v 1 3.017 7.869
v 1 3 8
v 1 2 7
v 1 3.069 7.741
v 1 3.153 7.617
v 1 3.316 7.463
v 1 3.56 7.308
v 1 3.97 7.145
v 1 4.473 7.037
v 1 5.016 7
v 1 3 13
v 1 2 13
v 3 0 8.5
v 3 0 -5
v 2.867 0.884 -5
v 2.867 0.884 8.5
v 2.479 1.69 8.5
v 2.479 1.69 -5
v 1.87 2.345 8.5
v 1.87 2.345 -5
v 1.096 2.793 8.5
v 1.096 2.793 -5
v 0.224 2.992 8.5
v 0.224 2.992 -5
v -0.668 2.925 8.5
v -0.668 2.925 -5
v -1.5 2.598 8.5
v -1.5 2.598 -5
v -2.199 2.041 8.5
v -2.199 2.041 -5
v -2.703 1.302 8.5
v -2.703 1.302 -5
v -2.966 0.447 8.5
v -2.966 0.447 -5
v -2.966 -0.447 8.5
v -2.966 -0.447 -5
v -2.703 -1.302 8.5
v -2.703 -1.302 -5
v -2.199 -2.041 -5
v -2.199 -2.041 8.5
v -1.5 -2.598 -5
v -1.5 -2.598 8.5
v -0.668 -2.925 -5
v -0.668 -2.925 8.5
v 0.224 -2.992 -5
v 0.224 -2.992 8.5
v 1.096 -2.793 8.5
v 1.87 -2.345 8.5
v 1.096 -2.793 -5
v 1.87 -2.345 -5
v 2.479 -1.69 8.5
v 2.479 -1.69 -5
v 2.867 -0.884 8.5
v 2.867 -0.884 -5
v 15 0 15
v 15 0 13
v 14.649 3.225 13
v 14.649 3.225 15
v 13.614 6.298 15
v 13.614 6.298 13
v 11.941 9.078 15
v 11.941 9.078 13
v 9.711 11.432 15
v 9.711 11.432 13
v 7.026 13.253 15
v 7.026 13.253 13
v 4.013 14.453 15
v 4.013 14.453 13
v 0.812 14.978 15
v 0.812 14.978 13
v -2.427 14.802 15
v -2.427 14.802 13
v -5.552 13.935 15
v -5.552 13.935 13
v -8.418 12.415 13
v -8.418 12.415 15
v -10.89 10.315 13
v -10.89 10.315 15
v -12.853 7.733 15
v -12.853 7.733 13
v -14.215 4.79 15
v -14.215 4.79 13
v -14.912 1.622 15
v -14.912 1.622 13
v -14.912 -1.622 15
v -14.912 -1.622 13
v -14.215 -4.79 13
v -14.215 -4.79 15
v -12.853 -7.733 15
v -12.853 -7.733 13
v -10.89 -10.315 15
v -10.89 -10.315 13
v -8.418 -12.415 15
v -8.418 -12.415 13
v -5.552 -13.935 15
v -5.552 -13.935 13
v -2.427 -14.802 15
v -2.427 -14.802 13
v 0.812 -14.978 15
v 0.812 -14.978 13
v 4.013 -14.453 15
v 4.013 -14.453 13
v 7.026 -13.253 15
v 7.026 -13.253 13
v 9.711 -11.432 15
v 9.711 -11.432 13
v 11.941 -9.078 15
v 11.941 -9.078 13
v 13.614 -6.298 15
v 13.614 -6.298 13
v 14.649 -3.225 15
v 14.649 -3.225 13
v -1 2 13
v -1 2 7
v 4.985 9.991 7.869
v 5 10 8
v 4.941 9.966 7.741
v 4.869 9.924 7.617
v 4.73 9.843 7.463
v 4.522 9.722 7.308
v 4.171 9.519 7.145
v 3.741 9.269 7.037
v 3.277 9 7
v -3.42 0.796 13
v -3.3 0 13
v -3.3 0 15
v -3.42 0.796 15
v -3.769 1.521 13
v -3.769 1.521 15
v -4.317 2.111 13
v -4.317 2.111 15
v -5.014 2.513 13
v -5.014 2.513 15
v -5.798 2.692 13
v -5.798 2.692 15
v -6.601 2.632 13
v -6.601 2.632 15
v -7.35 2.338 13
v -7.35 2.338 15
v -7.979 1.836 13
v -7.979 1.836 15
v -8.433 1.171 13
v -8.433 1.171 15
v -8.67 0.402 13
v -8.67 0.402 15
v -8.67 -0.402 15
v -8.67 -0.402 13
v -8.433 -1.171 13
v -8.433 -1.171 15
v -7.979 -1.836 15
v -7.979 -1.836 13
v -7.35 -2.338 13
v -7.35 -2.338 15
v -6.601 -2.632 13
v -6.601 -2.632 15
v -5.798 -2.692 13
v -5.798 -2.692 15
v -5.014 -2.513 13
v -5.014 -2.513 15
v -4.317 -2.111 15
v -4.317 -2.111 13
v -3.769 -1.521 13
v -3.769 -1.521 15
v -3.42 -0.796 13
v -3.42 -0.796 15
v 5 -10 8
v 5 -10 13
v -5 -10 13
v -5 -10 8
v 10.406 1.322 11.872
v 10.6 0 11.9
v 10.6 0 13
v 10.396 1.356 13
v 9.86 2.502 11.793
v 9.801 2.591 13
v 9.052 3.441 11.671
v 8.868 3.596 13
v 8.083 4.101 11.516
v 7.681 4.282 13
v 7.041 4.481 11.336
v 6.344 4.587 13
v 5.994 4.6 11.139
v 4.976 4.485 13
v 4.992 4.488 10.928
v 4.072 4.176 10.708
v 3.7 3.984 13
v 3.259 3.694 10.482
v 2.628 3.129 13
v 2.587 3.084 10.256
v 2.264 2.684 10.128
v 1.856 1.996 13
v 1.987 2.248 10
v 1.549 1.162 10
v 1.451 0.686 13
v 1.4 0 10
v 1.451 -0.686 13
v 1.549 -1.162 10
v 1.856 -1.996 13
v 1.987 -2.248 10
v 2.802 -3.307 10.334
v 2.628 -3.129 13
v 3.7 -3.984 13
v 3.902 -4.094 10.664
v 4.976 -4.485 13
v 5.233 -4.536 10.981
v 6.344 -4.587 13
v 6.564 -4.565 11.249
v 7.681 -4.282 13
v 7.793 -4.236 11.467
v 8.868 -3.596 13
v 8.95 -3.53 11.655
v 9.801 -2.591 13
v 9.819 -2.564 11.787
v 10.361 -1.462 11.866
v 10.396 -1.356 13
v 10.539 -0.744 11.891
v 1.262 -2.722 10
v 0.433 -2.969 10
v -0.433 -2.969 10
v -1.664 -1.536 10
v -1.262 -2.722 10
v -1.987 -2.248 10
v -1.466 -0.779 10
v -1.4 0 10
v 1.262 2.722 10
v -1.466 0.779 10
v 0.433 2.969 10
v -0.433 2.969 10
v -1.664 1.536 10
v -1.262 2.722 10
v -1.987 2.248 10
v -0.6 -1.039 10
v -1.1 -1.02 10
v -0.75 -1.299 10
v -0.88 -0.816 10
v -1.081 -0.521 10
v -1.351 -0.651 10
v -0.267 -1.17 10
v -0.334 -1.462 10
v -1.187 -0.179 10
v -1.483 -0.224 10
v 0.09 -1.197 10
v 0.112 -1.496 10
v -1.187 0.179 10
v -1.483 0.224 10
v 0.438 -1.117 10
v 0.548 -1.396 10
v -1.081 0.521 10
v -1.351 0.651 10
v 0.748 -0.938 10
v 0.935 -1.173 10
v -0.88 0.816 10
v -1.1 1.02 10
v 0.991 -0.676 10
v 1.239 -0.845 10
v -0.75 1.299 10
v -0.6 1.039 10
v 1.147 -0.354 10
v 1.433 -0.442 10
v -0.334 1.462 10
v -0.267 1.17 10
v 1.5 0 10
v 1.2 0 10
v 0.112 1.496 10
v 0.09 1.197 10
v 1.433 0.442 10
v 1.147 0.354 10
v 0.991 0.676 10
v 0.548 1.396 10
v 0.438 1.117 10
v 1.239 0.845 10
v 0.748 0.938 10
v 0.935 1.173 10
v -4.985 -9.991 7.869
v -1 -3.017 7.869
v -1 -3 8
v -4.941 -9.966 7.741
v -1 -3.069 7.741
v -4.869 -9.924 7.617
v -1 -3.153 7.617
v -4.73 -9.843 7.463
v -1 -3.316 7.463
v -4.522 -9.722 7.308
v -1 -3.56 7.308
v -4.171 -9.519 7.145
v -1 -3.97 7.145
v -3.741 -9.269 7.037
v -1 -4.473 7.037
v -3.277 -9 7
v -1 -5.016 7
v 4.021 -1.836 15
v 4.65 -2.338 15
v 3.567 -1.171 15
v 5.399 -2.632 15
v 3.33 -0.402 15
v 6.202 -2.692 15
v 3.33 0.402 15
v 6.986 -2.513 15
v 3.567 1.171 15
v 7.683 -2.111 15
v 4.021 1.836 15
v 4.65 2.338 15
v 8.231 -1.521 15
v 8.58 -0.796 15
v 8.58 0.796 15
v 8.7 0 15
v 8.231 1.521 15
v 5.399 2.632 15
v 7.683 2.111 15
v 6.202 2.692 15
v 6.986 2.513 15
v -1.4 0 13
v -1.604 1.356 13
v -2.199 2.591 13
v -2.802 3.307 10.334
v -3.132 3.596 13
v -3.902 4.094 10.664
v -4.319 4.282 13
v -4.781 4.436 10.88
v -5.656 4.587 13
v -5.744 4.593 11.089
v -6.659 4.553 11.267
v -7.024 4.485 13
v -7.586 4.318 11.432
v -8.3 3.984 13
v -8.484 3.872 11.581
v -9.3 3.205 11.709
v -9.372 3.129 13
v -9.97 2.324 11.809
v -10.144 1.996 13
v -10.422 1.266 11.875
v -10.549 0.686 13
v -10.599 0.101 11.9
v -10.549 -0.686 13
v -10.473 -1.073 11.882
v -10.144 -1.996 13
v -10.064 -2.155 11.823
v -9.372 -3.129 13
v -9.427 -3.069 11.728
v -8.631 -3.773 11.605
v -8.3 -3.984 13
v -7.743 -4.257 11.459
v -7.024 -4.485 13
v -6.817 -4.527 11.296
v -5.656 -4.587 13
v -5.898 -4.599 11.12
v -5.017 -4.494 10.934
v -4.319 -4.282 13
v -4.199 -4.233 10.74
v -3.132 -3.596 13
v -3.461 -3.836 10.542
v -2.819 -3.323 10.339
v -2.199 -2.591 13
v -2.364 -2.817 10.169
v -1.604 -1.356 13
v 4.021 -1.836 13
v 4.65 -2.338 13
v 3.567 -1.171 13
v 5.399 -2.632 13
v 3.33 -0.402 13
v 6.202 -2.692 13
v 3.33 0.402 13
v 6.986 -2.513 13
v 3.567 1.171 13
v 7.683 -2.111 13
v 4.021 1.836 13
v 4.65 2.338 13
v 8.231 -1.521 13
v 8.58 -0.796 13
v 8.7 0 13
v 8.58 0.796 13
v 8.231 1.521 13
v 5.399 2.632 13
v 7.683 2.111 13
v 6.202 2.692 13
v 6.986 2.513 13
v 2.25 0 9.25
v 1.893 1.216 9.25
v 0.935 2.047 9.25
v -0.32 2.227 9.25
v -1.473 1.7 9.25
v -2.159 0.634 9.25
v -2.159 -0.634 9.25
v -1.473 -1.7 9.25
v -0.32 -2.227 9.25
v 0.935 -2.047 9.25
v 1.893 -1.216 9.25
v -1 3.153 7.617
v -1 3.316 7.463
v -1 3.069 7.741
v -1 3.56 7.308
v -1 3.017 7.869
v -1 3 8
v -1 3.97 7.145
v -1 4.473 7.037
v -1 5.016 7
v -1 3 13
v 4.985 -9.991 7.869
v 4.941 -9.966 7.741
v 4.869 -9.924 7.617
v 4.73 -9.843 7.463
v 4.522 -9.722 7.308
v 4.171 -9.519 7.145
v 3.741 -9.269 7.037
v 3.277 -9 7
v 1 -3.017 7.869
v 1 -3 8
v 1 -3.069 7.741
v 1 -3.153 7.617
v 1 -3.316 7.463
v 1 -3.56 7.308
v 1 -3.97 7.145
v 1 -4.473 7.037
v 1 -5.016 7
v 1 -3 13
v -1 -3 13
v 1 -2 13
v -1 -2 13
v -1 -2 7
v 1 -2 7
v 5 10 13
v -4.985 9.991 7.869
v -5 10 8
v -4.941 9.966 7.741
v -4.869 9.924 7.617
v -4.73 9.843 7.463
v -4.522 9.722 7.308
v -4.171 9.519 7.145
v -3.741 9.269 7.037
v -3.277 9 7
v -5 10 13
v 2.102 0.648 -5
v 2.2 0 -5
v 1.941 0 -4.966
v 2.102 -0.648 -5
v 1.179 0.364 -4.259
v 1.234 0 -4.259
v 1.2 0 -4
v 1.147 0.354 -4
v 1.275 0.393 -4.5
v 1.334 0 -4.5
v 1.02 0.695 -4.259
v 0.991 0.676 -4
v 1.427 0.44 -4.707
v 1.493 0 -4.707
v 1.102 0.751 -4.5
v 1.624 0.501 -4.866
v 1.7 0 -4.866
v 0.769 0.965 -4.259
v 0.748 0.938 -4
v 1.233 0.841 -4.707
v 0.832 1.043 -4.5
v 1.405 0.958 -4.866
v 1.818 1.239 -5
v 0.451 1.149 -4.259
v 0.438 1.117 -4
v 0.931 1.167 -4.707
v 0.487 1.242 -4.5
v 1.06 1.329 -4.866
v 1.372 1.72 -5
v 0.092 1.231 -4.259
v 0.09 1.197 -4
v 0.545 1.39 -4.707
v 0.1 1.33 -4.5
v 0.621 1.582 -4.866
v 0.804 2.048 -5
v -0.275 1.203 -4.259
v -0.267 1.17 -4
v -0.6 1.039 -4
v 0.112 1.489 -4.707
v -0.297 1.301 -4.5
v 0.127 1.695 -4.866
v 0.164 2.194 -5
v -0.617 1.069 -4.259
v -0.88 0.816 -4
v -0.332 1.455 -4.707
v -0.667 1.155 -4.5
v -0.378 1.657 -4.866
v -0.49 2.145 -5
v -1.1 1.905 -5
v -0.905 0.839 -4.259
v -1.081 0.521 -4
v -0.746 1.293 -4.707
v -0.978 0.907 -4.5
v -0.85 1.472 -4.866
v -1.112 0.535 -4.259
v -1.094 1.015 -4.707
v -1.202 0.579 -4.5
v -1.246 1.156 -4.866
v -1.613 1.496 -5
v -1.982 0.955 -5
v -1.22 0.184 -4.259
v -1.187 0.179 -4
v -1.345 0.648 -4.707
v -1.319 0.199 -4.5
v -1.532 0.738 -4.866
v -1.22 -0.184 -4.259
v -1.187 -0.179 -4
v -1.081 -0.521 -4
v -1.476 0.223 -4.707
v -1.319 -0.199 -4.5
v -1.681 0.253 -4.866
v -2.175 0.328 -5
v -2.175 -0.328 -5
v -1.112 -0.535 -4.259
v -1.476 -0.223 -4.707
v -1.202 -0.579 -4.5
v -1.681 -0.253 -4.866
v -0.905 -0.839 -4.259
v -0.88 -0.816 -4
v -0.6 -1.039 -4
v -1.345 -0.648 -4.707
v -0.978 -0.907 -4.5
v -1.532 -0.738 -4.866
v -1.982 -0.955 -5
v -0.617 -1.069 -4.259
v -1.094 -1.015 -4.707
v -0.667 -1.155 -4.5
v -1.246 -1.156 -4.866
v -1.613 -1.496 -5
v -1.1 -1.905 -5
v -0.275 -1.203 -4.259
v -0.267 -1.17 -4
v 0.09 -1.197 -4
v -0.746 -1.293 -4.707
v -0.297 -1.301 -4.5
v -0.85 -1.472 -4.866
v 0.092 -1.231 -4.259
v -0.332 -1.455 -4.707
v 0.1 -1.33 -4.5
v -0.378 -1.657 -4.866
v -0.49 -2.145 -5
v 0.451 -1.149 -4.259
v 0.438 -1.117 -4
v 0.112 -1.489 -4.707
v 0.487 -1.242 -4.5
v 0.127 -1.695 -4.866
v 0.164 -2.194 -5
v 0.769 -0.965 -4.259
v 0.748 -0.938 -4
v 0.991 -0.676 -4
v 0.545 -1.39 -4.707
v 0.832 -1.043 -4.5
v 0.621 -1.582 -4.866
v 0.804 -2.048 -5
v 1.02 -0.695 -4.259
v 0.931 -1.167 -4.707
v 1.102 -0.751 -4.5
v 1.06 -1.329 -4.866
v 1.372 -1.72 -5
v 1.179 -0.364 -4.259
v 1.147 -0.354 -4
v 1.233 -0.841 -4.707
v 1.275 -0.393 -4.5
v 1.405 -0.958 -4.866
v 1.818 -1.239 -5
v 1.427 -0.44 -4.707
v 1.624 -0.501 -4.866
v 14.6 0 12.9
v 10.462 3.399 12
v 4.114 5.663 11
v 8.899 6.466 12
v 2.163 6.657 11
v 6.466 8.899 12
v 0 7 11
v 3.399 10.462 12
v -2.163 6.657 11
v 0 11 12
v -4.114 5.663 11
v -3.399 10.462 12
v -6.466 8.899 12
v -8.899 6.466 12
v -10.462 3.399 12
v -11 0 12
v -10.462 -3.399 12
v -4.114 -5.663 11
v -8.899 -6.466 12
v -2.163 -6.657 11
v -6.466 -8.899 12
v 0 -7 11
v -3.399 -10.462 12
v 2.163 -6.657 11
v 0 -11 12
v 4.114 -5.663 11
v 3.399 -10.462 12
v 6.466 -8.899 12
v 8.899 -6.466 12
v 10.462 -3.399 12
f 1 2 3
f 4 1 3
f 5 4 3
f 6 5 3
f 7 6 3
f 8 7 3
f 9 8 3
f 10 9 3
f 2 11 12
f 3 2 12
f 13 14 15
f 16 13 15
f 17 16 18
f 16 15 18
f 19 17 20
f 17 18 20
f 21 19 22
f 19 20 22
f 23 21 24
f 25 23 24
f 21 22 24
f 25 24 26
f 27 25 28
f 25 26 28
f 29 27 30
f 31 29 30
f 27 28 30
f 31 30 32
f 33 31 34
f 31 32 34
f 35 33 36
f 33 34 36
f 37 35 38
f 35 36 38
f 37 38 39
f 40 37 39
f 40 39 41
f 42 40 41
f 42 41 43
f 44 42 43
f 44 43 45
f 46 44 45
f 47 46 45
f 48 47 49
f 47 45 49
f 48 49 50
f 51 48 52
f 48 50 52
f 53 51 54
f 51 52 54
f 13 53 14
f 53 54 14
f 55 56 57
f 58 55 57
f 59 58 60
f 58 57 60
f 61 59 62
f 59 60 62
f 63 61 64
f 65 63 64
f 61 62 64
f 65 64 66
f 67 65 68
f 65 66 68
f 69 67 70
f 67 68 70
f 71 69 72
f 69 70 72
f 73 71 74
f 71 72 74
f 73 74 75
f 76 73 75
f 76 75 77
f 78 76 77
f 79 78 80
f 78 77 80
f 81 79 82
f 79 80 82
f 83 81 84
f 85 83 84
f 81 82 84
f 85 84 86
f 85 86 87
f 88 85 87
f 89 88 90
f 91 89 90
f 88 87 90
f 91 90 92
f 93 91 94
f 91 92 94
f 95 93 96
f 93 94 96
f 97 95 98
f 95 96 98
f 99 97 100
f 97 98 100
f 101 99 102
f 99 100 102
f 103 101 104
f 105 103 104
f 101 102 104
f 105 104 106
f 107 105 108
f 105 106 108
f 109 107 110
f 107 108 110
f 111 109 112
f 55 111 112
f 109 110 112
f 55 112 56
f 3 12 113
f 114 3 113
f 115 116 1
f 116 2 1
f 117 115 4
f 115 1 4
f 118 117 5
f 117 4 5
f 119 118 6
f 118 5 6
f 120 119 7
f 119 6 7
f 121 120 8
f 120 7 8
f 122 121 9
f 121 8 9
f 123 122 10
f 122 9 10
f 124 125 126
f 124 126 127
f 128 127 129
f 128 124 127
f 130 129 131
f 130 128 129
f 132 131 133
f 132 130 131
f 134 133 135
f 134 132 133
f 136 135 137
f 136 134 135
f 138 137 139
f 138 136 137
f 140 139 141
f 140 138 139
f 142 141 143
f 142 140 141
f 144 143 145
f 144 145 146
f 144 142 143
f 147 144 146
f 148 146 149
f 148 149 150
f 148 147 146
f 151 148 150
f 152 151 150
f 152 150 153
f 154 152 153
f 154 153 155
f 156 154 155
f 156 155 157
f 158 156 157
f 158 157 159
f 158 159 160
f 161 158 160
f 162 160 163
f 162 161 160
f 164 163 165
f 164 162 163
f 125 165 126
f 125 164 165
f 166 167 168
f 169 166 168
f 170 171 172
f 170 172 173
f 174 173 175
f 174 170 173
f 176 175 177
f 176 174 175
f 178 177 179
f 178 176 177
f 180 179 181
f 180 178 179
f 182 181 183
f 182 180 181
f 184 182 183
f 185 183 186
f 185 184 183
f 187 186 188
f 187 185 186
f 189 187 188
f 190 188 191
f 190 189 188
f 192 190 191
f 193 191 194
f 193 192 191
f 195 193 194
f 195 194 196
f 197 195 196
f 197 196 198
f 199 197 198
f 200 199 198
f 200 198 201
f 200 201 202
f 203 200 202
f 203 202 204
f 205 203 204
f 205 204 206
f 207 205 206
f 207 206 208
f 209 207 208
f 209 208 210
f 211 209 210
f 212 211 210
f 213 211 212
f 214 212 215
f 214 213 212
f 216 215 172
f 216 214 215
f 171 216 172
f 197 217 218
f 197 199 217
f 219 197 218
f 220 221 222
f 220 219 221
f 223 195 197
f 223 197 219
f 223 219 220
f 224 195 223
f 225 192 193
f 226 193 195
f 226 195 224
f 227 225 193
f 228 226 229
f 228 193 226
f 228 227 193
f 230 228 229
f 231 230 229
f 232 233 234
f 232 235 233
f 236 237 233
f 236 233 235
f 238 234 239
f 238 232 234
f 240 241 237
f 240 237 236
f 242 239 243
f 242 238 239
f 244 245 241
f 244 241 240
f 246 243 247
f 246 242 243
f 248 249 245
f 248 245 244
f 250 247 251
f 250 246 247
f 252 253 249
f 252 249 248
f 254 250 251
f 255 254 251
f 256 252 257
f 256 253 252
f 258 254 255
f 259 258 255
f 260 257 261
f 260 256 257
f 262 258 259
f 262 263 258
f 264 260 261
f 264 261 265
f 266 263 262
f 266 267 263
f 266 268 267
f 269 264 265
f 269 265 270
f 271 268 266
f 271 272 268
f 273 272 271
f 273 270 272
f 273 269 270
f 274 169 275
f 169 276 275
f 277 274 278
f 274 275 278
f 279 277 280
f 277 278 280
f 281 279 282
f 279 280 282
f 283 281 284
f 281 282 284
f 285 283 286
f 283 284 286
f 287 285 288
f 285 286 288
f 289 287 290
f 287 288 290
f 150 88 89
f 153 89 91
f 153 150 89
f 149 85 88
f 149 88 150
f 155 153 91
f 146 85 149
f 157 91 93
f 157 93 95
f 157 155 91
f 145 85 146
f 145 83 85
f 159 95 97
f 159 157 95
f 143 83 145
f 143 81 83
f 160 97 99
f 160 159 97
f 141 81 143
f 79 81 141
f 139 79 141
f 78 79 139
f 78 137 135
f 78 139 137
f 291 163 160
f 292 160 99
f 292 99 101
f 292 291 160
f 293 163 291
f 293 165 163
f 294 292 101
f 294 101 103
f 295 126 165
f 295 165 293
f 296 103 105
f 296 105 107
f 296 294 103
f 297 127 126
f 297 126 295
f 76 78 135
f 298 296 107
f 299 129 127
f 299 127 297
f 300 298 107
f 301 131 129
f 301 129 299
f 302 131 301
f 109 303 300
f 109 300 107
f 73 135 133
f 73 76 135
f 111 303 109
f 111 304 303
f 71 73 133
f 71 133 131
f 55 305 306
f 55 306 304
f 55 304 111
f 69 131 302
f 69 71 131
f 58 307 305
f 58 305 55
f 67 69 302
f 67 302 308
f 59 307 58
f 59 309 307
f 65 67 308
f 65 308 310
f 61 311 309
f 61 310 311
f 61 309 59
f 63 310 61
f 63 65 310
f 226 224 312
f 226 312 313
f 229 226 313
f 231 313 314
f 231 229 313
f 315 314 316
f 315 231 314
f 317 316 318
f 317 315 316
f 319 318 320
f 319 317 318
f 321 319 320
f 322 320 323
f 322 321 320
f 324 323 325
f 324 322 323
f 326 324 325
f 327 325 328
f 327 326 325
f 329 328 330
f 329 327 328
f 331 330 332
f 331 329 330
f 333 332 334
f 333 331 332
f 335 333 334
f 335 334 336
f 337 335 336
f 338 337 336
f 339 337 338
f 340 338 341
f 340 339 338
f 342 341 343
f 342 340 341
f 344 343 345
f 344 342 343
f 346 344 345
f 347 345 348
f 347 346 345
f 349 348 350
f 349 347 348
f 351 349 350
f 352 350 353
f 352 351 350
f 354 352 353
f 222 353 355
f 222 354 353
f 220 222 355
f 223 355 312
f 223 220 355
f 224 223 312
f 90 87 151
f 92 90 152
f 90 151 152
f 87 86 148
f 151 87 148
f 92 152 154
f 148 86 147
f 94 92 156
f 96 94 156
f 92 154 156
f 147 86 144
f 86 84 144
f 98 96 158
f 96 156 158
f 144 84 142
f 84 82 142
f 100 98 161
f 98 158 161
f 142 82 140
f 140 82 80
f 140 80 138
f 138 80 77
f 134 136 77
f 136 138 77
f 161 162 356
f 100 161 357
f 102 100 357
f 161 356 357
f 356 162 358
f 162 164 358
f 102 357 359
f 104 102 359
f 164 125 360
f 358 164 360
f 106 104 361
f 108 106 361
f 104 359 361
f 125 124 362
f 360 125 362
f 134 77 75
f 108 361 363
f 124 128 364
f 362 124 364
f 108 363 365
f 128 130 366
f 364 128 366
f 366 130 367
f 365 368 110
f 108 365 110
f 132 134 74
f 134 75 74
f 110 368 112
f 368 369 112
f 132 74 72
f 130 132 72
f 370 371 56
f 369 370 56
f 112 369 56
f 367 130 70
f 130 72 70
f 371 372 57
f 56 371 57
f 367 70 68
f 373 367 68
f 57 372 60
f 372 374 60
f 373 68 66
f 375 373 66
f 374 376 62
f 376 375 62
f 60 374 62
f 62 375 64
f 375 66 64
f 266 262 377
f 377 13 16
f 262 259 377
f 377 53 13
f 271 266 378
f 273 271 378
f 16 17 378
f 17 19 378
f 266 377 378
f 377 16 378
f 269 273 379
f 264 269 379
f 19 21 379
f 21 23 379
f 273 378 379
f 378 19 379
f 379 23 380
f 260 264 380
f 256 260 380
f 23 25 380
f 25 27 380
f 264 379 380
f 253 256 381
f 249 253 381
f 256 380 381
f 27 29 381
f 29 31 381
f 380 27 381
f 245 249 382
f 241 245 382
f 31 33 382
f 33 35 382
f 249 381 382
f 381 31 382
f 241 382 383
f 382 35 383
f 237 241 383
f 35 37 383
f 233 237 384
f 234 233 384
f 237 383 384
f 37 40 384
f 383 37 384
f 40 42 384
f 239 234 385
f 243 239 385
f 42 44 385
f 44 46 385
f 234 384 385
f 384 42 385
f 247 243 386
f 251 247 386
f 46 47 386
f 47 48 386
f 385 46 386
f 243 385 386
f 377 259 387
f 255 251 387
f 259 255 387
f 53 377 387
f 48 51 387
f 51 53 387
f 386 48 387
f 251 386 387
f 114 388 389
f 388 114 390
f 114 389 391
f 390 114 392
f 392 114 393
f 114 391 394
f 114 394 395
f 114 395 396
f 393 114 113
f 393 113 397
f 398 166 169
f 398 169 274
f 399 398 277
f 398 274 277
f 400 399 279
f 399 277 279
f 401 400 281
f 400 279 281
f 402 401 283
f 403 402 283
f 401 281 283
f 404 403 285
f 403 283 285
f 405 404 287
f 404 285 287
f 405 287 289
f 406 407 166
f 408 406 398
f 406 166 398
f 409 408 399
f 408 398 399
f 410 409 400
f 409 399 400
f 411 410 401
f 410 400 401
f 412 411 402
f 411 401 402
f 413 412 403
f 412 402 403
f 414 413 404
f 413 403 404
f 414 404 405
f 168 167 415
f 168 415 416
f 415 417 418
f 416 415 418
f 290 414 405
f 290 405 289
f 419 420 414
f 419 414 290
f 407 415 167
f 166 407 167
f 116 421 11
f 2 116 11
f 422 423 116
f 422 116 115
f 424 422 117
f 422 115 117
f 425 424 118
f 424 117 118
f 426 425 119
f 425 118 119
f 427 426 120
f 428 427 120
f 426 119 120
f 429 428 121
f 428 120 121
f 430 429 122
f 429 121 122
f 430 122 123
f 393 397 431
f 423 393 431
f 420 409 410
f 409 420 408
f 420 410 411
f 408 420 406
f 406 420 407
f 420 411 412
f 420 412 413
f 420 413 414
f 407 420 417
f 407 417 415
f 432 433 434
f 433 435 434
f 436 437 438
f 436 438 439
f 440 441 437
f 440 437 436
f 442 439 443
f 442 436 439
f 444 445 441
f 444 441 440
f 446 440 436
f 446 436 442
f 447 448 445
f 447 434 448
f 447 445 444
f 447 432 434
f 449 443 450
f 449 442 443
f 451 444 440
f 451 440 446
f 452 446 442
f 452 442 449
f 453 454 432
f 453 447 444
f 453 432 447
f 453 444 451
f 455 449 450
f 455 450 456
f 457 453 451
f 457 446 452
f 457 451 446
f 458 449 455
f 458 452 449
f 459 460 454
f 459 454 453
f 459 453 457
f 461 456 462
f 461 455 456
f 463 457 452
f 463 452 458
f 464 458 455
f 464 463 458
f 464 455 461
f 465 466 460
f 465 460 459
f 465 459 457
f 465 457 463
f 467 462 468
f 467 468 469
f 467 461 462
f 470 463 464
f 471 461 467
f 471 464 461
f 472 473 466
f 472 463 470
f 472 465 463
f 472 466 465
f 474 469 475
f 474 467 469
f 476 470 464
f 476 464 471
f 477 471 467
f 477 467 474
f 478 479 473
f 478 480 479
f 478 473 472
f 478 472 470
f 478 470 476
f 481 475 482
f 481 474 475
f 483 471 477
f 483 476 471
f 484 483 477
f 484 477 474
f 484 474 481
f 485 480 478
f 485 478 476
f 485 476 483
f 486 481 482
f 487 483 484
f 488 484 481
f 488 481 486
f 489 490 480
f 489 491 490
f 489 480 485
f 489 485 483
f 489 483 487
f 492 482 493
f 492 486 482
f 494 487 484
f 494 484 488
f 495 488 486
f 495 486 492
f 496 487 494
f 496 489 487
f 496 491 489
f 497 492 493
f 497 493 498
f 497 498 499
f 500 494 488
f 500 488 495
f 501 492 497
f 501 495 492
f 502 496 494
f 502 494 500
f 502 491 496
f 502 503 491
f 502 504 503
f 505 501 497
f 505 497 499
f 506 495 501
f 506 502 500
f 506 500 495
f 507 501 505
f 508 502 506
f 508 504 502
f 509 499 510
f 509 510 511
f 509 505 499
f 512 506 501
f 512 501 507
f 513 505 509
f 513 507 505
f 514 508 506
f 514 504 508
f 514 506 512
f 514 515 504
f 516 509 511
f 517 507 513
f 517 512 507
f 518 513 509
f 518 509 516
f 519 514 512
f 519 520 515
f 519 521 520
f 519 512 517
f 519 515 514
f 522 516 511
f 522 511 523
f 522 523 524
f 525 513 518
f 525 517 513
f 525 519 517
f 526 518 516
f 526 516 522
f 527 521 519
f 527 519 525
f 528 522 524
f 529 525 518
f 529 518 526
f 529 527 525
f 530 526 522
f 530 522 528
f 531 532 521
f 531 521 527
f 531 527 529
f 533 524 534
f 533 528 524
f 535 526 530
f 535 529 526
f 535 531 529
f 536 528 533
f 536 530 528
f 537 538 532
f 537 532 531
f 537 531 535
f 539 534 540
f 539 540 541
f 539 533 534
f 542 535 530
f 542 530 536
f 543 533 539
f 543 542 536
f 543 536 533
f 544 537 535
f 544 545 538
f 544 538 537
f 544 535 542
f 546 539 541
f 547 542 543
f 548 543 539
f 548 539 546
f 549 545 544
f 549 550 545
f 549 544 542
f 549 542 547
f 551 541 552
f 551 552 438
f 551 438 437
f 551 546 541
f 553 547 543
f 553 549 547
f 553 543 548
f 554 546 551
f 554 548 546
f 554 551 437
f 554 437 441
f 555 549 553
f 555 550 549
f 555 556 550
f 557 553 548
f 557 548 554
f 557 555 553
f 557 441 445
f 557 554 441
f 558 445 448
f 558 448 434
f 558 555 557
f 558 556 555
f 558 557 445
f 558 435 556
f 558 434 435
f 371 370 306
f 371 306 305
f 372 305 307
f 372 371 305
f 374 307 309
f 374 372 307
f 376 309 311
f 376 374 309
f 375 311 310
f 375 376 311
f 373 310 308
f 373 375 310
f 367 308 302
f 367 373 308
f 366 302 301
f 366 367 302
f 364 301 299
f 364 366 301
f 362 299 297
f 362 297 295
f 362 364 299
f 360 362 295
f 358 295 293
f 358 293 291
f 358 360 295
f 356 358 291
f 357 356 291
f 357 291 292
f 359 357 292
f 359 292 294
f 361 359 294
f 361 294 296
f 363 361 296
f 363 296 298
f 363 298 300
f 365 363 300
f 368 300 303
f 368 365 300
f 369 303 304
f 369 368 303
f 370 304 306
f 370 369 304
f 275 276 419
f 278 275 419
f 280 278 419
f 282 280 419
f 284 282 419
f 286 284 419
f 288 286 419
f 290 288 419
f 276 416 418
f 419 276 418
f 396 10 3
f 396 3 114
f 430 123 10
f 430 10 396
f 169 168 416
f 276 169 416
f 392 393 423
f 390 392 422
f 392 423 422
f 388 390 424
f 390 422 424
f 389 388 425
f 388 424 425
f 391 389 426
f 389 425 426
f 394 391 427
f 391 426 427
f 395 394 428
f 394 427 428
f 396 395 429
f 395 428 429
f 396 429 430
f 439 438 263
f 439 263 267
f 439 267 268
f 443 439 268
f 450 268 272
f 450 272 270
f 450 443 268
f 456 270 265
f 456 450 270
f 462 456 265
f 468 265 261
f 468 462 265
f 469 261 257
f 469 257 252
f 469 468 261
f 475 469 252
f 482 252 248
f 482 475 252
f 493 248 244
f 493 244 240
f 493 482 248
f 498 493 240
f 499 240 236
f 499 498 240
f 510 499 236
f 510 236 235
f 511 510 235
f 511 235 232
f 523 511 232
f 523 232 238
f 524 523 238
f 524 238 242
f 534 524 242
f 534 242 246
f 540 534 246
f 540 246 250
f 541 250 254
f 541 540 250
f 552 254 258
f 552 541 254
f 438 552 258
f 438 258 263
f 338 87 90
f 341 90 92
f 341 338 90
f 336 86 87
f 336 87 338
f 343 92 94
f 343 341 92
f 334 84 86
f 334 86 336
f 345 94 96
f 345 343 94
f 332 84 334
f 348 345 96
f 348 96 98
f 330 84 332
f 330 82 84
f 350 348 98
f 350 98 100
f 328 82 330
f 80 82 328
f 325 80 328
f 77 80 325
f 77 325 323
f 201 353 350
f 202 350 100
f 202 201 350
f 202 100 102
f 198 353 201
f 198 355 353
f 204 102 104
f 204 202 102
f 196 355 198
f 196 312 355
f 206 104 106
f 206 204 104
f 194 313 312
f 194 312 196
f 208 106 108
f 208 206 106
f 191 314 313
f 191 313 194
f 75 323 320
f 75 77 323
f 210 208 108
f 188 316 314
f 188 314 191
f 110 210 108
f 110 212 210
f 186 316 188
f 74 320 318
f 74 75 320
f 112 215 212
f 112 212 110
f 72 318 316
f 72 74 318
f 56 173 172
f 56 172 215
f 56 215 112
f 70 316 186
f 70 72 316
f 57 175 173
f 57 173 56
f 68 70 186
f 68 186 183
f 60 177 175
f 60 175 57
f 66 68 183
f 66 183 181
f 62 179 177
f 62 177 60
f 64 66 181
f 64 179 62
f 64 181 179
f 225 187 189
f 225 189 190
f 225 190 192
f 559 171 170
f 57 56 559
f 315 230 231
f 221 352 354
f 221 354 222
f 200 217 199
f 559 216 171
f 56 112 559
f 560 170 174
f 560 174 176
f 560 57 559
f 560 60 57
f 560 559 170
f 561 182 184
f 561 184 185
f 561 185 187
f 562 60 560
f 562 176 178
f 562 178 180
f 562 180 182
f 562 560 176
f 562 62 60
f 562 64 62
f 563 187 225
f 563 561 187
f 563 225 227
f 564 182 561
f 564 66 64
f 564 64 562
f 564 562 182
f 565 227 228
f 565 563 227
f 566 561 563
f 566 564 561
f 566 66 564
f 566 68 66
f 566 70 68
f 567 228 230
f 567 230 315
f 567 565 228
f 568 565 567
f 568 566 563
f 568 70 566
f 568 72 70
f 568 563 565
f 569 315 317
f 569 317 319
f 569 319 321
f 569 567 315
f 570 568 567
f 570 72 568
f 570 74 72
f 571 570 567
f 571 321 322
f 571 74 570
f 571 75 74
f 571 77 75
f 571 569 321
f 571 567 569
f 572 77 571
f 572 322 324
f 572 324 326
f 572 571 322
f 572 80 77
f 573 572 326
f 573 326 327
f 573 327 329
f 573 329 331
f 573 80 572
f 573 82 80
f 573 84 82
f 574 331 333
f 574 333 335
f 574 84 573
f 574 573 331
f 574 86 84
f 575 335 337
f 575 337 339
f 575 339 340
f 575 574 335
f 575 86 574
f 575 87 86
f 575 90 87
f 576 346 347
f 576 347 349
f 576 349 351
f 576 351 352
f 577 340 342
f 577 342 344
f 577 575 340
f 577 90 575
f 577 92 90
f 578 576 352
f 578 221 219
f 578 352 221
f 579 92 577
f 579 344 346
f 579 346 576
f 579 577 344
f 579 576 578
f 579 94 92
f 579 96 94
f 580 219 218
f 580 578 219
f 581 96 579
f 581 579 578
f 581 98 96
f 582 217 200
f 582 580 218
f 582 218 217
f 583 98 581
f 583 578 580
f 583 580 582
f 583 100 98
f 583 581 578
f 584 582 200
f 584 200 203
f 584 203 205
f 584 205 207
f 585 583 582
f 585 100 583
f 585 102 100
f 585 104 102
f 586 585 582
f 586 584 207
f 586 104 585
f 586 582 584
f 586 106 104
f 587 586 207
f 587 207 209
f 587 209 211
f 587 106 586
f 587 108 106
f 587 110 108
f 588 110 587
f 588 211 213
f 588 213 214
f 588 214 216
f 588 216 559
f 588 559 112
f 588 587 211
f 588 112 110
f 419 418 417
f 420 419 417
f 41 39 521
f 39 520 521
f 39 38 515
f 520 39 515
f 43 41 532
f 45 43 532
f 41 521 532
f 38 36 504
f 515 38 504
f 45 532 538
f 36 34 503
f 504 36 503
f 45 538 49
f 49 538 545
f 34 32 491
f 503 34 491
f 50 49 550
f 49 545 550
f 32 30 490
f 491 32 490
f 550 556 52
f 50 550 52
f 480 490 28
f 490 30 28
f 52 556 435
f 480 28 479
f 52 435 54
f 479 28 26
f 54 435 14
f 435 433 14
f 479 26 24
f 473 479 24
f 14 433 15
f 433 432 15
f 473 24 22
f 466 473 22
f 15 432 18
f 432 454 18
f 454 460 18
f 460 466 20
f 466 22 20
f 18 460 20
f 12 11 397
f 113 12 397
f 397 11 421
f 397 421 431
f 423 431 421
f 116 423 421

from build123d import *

# Parameters (mm, degrees)
SKETCH003_R   = 15
SKETCH003_R_2 = 2.7
PAD001_DEPTH  = 2
SKETCH004_R   = 4.6
PAD002_DEPTH  = 3
PAD003_DEPTH  = 6
FILLET001_R   = 1
SKETCH_R      = 3
SKETCH_R_2    = 1.2
PAD_DEPTH     = 15
FILLET_R      = 1
CHAMFER_SIZE  = 1.5


with BuildPart() as pcbmount:
    # Sketch003 → Pad001 (new body)
    with BuildSketch(Plane.XY.offset(13)):
        Circle(SKETCH003_R)
        with Locations((-6, 0)):
            Circle(SKETCH003_R_2, mode=Mode.SUBTRACT)
        with Locations((6, 0)):
            Circle(SKETCH003_R_2, mode=Mode.SUBTRACT)
    extrude(amount=PAD001_DEPTH)


with BuildPart() as pad002:
    # Sketch004 → Pad002 (new body)
    with BuildSketch(Plane.XY.offset(10)):
        with Locations((-6, 0)):
            Circle(SKETCH004_R)
        with Locations((6, 0)):
            Circle(SKETCH004_R)
    extrude(amount=PAD002_DEPTH)


with BuildPart() as cut:
    # Cone → Cone (revolve)
    with BuildSketch(Plane(origin=(0, 0, 10), x_dir=(1, 0, 0), z_dir=(0, -1, 0))):
        Polygon((0, 0), (3, 0), (15, 3), (0, 3), align=None)
    revolve(axis=Axis((0, 0, 10), (0, 0, 1)))

    # Cut: cut Pad002
    add(pad002.part, mode=Mode.SUBTRACT)


with BuildPart() as fillet001:
    # Sketch005 → Pad003 (new body)
    with BuildSketch(Plane.XY.offset(13)):
        Polygon((-5, 10), (5, 10), (1, 3), (1, 2), (-1, 2), (-1, 3), align=None)
        Polygon((1, -3), (5, -10), (-5, -10), (-1, -3), (-1, -2), (1, -2), align=None)
    extrude(amount=-PAD003_DEPTH)

    # Fillet001
    fillet001_edges = [fillet001.edges().sort_by_distance(p)[0] for p in [
        (0, 10, 7),
        (3, 6.5, 7),
        (-3, 6.5, 7),
        (3, -6.5, 7),
        (0, -10, 7),
        (-3, -6.5, 7),
    ]]
    fillet(fillet001_edges, radius=FILLET001_R)


with BuildPart() as chamfer_body:
    # Sketch → Pad (new body)
    with BuildSketch(Plane.XY.offset(-5)):
        Circle(SKETCH_R)
        Circle(SKETCH_R_2, mode=Mode.SUBTRACT)
    extrude(amount=PAD_DEPTH)

    # Fillet
    fillet_edges = [chamfer_body.edges().sort_by_distance(p)[0] for p in [
        (-1.2, 0, -5),
    ]]
    fillet(fillet_edges, radius=FILLET_R)

    # Chamfer
    chamfer_edges = [chamfer_body.edges().sort_by_distance(p)[0] for p in [
        (-3, 0, 10),
    ]]
    chamfer(chamfer_edges, length=CHAMFER_SIZE)


solid = Compound([pcbmount.part, cut.part, fillet001.part, chamfer_body.part])
